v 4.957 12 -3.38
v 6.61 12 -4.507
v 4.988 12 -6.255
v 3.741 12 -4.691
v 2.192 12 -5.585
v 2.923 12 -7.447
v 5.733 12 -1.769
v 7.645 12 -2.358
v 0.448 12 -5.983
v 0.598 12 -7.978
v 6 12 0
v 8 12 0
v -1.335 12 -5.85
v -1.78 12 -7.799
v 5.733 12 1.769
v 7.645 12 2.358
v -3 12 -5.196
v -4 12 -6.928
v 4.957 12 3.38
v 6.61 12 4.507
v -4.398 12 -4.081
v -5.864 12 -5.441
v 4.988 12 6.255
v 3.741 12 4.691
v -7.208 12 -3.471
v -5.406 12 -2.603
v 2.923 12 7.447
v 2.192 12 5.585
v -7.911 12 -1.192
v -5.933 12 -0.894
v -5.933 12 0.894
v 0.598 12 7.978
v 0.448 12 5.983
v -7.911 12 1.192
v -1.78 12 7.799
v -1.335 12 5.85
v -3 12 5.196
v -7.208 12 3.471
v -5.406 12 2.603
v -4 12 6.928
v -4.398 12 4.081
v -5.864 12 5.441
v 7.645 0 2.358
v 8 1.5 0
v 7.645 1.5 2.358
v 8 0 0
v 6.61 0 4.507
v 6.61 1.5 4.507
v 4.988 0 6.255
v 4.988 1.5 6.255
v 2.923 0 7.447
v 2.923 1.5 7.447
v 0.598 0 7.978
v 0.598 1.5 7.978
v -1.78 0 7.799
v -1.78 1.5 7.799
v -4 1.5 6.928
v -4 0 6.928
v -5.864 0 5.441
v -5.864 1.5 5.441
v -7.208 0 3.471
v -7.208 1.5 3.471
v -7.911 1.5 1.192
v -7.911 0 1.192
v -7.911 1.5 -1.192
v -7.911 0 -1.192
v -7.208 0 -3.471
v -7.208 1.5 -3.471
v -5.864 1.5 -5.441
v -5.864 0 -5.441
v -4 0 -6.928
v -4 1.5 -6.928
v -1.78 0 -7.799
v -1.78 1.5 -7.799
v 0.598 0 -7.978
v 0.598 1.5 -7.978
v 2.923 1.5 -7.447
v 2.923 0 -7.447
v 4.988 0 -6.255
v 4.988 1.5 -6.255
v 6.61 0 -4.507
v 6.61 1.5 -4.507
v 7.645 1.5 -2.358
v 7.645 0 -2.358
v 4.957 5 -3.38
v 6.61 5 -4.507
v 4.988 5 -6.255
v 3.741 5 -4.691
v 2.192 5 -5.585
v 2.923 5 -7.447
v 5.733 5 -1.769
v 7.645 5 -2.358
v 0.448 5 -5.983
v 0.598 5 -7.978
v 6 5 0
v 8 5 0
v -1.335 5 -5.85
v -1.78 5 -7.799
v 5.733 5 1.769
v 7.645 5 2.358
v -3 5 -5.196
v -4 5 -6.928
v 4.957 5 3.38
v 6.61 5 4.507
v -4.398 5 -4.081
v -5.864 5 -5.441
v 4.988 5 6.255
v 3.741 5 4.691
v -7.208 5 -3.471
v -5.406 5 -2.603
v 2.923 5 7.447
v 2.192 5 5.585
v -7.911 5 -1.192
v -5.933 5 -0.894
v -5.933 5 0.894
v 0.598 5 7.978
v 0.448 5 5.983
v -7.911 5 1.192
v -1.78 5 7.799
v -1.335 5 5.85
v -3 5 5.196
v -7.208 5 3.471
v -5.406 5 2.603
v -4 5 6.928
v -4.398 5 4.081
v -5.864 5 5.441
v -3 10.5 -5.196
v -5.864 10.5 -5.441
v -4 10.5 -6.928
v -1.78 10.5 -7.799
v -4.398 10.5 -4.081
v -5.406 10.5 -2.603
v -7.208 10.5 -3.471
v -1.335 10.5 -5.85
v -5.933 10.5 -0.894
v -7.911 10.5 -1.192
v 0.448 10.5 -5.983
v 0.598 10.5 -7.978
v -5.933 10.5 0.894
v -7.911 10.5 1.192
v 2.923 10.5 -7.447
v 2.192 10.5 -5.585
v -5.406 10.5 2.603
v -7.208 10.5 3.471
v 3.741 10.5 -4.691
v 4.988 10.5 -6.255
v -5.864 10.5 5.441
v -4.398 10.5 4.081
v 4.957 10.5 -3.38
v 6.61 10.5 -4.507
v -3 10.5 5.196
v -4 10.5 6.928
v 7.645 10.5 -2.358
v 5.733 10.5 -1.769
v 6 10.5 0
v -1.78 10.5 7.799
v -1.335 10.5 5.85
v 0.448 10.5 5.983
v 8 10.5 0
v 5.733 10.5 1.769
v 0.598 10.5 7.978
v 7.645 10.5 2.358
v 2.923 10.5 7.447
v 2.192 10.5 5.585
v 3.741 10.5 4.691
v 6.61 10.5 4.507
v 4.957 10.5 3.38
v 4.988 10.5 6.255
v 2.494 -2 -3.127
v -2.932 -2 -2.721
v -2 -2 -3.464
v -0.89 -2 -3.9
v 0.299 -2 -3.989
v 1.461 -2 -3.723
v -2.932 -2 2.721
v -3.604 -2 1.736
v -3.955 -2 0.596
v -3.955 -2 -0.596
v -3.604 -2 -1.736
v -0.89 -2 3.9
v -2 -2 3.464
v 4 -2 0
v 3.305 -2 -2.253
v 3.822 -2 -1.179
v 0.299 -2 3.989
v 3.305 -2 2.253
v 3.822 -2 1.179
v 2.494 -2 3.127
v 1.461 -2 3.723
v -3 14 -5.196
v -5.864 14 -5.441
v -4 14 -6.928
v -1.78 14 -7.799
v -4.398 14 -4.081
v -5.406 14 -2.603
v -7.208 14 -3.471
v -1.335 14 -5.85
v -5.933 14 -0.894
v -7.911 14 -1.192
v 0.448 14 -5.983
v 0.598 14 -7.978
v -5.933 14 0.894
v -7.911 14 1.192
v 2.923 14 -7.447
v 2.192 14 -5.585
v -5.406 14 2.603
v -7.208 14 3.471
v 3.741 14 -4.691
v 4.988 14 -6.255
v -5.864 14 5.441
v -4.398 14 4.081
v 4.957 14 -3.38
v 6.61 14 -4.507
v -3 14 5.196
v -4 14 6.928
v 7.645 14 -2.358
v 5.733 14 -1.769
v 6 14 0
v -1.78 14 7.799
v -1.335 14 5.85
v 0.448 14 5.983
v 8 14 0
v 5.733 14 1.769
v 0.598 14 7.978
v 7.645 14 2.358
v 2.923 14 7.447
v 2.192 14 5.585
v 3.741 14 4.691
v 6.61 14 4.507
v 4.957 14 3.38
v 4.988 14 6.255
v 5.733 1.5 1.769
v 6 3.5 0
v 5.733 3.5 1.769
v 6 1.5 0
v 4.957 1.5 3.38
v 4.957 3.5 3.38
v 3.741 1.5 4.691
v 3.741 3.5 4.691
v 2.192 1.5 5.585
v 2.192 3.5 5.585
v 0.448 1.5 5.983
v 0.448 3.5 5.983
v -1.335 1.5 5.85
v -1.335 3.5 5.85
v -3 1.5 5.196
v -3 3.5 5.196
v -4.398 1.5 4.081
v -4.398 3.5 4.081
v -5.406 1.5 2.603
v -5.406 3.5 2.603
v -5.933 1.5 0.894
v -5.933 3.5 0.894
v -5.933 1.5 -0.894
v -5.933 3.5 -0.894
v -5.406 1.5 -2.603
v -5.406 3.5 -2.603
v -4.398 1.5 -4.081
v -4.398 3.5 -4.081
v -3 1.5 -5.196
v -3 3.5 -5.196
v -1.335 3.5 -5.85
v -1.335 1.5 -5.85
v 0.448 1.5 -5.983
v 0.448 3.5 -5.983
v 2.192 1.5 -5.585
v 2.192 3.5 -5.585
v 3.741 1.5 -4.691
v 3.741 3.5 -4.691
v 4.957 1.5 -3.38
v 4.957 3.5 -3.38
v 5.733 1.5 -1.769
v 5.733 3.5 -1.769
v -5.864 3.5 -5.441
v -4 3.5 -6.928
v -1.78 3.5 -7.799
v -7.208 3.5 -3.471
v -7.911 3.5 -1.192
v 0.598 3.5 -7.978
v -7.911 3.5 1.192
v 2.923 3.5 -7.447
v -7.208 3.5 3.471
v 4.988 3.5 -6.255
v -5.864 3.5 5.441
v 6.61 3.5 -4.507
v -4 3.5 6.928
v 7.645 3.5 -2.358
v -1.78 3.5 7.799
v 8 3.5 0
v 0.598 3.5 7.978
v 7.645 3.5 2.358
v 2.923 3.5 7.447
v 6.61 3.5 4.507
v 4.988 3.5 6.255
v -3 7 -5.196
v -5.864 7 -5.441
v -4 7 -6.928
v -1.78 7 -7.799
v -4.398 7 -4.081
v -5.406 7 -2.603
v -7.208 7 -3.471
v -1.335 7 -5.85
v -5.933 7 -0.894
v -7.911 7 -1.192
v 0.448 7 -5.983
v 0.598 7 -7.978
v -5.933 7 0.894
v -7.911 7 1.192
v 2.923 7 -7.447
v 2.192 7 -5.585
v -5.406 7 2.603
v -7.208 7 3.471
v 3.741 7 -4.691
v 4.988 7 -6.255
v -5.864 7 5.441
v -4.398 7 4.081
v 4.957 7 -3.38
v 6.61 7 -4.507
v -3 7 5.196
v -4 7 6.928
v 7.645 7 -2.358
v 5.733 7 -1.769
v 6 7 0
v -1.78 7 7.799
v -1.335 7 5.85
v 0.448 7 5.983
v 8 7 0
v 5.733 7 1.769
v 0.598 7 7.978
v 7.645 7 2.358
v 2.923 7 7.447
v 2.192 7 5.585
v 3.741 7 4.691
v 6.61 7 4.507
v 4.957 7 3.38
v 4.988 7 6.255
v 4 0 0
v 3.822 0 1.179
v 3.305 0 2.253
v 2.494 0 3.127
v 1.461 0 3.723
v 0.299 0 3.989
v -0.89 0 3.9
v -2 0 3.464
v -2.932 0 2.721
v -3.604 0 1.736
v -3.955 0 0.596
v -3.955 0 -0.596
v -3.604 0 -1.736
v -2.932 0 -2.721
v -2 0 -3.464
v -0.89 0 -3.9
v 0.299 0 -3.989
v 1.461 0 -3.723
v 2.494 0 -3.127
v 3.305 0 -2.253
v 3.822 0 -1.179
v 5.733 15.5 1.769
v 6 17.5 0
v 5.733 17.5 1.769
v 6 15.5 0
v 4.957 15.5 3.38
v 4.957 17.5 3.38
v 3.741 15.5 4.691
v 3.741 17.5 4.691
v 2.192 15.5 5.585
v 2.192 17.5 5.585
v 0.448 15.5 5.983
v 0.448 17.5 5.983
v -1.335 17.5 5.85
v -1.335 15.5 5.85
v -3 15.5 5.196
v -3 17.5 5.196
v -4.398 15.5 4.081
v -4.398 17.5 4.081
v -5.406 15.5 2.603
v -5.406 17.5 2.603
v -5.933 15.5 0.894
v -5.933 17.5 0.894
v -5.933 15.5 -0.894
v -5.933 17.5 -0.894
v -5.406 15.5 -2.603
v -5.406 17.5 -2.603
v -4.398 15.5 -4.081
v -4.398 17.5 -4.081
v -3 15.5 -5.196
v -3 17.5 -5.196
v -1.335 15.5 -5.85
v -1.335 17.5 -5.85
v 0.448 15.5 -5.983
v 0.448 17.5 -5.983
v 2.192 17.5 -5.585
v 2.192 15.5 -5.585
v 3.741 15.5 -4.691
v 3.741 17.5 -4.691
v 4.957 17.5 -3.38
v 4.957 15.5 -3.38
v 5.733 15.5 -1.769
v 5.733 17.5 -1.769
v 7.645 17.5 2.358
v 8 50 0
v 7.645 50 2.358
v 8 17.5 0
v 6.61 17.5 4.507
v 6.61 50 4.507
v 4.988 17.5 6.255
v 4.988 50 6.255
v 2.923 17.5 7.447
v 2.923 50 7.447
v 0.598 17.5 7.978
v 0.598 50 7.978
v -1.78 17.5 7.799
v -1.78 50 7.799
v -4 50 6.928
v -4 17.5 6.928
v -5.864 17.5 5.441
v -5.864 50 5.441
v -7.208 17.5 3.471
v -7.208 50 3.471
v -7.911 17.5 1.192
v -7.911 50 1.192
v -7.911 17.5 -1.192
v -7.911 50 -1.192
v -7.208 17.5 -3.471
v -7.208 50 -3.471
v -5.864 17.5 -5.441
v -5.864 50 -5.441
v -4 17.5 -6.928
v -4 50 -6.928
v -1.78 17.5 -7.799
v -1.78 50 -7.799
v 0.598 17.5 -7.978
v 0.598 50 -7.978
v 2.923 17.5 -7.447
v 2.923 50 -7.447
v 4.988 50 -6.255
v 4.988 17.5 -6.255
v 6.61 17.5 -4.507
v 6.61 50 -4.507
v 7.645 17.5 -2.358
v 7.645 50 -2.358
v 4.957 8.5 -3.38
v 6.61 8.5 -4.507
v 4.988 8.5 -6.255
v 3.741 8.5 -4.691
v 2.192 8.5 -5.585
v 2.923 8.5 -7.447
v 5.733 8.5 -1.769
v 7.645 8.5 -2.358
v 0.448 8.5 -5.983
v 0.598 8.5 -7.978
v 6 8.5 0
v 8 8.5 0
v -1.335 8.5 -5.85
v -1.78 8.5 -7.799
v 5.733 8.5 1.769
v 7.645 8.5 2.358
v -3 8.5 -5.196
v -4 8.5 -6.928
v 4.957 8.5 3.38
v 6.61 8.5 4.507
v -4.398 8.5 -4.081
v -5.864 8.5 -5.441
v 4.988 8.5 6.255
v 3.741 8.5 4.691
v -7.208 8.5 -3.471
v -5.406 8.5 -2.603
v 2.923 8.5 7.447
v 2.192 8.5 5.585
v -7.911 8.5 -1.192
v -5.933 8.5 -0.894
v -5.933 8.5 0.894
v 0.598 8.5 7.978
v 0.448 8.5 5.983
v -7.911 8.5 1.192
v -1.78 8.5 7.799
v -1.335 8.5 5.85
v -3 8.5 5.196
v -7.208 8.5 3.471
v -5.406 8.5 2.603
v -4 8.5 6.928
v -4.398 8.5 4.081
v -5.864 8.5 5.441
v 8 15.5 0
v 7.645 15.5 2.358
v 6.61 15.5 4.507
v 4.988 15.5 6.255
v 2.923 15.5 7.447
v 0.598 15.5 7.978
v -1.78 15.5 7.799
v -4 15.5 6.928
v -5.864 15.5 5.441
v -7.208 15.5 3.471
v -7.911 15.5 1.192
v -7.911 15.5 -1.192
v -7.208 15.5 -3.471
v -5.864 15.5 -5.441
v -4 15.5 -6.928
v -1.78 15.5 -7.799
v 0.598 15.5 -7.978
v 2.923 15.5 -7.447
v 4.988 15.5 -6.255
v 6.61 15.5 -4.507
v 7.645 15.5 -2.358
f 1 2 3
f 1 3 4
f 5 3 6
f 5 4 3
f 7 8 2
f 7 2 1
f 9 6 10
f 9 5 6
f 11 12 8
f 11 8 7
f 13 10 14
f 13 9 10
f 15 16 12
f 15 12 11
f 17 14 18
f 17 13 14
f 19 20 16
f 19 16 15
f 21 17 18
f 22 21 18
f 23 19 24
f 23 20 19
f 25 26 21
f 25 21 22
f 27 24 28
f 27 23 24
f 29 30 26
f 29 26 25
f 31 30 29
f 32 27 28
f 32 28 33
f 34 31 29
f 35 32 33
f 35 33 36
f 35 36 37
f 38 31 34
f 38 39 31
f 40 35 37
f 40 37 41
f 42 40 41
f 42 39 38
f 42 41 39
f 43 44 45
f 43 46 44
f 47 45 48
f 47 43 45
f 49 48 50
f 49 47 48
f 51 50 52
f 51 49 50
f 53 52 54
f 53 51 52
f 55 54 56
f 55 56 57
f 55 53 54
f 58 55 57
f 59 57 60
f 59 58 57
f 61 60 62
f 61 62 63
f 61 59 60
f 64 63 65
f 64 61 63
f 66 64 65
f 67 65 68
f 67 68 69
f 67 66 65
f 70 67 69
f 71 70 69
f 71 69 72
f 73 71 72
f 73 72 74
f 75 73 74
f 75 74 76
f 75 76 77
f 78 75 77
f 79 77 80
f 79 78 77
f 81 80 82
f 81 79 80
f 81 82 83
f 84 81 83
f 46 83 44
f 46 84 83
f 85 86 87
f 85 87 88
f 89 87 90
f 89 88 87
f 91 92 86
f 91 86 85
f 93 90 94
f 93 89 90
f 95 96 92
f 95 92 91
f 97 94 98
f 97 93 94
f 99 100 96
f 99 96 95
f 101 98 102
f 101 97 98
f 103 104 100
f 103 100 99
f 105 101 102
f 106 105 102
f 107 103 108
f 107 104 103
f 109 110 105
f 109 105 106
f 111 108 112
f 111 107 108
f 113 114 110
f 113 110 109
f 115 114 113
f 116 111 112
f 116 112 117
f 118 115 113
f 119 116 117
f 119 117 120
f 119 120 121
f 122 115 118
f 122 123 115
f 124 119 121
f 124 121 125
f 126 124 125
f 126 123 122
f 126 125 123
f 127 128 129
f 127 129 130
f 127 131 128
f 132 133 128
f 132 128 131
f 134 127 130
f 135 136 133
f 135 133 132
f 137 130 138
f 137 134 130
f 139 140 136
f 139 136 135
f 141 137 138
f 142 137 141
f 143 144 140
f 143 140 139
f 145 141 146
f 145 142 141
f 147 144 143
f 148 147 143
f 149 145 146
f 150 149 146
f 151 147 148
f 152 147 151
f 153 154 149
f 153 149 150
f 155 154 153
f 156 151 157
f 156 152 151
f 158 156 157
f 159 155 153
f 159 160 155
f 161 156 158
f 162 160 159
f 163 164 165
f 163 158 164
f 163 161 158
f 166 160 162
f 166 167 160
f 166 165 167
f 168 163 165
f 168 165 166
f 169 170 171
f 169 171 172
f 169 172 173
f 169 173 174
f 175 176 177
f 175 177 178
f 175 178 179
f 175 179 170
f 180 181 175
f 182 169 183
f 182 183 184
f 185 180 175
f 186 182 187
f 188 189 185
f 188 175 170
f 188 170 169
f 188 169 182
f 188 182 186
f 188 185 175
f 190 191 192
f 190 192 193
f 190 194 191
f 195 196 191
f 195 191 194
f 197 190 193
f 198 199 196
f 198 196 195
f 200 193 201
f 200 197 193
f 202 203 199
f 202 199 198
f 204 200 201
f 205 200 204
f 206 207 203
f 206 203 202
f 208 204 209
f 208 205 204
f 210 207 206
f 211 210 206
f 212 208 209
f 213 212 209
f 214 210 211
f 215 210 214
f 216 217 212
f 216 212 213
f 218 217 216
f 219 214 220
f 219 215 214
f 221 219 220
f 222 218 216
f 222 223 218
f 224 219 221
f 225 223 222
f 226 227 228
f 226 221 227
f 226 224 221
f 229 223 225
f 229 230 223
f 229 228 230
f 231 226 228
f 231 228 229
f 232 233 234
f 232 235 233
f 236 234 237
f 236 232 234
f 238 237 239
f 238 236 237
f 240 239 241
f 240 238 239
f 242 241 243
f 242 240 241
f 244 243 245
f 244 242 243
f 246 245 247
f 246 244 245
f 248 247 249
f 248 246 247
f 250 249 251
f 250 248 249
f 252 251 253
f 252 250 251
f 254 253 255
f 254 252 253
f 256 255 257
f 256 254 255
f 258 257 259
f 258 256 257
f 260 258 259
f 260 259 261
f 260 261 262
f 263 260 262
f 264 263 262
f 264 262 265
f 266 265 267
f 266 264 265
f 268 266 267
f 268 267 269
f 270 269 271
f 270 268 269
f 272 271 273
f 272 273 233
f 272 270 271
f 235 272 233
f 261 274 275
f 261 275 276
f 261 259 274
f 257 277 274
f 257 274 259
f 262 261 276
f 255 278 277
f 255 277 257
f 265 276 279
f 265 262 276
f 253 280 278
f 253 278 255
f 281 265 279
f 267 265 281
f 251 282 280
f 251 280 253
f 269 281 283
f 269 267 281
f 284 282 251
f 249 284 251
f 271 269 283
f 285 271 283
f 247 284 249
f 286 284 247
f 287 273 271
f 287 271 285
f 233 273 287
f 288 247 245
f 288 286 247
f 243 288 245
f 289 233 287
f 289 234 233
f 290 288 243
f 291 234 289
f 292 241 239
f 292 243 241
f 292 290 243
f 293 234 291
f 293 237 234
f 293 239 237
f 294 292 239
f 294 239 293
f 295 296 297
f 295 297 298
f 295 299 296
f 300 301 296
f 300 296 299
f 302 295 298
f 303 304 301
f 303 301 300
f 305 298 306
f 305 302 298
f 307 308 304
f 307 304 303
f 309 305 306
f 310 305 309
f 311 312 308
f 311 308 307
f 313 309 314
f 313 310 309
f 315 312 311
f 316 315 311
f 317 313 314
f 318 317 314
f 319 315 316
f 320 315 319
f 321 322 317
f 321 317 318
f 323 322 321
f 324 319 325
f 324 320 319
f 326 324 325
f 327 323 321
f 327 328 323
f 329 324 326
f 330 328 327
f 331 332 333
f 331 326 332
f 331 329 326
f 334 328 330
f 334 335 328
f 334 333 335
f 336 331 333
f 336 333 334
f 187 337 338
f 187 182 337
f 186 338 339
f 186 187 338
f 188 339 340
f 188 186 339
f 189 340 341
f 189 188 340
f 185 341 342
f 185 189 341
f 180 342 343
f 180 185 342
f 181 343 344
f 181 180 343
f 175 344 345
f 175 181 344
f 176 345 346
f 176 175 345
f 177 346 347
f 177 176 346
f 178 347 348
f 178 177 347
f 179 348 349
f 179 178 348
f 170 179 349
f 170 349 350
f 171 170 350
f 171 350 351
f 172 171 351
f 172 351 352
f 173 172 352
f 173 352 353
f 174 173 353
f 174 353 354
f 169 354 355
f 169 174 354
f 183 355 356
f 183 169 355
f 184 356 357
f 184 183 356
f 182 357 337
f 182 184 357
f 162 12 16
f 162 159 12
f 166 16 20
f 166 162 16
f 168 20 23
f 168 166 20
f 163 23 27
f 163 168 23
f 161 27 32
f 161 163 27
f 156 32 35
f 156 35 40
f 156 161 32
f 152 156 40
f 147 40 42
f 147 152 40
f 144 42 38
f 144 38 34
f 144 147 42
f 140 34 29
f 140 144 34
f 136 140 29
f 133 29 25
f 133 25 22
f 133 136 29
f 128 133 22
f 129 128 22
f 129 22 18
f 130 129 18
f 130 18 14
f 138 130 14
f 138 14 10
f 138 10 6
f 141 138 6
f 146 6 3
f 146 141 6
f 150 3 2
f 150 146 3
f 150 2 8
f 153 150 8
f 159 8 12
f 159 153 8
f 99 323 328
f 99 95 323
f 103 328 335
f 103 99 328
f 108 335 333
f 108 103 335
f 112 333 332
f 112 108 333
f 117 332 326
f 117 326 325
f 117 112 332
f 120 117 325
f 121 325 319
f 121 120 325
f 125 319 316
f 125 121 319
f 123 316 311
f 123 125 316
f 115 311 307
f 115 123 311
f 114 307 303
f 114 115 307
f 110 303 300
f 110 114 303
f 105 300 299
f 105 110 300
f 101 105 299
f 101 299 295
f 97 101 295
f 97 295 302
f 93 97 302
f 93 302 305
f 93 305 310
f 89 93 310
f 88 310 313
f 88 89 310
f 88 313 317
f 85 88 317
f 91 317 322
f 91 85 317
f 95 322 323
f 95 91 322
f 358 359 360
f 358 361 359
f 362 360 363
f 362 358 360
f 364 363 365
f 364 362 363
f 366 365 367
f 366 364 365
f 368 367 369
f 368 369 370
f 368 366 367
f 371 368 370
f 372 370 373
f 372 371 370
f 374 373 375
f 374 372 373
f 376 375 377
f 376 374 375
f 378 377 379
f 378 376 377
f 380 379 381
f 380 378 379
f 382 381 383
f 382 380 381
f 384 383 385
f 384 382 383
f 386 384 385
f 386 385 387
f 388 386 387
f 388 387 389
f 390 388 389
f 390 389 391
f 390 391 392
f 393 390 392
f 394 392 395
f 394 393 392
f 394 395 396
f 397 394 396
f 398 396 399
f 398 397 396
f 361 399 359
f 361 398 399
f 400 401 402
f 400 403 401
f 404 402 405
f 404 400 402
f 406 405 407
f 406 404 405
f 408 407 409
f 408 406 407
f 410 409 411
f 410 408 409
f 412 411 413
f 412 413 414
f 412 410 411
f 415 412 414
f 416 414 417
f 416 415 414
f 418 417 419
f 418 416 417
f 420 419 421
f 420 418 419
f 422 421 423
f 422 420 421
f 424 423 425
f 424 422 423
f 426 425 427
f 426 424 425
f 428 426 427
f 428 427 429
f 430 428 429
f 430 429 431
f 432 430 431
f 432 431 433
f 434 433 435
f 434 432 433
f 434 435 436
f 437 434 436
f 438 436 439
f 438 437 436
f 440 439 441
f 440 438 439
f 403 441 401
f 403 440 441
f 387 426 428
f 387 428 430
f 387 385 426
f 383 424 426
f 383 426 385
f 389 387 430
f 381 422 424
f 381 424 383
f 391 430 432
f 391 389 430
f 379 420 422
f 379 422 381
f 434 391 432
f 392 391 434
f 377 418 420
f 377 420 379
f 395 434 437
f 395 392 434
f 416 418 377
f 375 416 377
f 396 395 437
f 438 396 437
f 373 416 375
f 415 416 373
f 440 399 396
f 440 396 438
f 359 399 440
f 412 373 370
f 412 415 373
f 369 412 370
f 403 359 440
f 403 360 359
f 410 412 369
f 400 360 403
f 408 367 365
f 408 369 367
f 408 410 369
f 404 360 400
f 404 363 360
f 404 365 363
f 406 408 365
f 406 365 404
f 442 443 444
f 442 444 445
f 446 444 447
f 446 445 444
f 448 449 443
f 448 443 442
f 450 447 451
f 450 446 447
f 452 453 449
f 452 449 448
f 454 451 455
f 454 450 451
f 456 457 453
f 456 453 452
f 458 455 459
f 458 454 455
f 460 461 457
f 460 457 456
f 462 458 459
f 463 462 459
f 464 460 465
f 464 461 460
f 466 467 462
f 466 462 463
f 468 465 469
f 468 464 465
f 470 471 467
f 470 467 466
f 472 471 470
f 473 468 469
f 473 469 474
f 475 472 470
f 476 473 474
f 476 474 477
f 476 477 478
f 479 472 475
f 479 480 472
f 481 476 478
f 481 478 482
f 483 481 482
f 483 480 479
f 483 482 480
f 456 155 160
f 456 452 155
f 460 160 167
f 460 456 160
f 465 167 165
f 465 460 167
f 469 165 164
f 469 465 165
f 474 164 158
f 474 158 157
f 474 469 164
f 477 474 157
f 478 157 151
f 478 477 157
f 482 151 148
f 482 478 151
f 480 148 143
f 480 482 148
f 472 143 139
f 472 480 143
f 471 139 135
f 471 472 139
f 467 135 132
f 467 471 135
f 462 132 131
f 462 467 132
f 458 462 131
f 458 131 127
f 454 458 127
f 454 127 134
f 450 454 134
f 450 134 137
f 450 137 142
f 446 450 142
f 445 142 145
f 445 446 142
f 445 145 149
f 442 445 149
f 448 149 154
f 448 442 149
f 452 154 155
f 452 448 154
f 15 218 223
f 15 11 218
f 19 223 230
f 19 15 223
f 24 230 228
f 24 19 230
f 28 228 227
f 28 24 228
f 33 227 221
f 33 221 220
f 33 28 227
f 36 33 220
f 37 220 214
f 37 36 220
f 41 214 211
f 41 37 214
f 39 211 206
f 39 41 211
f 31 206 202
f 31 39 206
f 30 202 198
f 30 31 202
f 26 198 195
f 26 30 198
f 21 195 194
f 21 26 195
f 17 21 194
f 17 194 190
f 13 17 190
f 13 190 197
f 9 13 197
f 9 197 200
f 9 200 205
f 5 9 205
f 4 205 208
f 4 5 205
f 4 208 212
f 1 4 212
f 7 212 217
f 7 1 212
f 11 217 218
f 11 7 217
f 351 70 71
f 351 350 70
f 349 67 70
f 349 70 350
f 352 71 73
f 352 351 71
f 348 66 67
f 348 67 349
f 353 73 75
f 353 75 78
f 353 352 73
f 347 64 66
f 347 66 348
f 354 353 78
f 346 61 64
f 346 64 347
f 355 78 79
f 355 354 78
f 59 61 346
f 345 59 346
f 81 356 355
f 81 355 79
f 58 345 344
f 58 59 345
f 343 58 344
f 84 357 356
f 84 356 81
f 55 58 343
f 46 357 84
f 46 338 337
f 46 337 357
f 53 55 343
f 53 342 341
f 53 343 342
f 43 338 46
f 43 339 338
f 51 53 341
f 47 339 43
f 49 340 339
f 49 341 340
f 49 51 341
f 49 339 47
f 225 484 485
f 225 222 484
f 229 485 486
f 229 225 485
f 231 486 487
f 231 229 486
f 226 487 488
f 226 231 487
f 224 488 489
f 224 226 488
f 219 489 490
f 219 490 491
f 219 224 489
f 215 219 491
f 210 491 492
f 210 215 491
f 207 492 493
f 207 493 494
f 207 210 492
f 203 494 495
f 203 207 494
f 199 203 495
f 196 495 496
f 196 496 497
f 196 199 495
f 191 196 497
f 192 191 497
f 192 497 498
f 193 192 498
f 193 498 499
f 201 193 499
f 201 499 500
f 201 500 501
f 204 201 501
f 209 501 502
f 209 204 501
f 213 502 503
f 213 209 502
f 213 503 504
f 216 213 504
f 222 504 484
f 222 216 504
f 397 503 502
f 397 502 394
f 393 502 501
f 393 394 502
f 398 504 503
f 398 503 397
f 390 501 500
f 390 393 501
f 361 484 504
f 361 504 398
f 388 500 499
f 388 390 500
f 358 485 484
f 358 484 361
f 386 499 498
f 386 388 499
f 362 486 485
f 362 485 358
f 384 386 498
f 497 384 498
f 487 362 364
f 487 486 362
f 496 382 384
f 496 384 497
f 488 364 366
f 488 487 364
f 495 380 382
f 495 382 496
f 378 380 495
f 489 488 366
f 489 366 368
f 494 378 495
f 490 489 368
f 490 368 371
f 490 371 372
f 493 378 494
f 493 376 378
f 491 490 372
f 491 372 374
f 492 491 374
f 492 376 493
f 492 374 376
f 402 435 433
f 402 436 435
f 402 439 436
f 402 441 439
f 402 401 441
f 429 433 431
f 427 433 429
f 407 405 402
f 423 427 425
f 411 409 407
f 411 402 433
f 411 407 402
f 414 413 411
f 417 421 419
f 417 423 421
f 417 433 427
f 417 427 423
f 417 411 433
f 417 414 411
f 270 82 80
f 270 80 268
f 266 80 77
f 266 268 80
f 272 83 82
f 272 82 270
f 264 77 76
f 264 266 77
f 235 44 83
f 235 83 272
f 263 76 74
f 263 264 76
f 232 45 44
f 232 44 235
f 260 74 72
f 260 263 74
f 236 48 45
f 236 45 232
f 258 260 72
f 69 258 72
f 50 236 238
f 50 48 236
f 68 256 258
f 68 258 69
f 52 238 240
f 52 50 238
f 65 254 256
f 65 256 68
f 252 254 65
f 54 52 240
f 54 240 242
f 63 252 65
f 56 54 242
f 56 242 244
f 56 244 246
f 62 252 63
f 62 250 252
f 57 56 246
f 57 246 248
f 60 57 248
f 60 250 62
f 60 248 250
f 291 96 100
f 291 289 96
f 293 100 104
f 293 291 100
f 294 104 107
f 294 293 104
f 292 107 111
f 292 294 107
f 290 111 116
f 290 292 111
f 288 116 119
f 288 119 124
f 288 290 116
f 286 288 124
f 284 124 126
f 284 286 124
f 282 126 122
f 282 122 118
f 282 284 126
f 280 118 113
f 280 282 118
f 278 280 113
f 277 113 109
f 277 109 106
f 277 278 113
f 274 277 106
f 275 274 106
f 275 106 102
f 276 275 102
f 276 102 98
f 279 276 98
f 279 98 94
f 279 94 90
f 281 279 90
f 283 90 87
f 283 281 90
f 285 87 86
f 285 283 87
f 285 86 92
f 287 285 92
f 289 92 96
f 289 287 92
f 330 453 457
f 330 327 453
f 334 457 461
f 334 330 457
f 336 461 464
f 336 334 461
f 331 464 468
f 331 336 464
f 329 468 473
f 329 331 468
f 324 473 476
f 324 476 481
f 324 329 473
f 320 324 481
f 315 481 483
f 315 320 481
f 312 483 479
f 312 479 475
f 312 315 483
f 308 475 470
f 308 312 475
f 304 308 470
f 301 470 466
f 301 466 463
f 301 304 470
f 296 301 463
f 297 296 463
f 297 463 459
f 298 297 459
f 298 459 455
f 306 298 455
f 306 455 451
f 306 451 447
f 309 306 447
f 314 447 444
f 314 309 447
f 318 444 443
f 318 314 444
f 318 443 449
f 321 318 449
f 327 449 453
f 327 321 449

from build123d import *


with BuildPart() as part:
    # Croquis1 → Revolución1 (revolve)
    with BuildSketch(Plane.XY):
        Polygon((0, 50), (8, 50), (8, 17.5), (6, 17.5), (6, 15.5), (8, 15.5), (8, 14), (6, 14), (6, 12), (8, 12), (8, 10.5), (6, 10.5), (6, 8.5), (8, 8.5), (8, 7), (6, 7), (6, 5), (8, 5), (8, 3.5), (6, 3.5), (6, 1.5), (8, 1.5), (8, 0), (4, 0), (4, -2), (0, -2), (0, 0), align=None)
    revolve(axis=Axis((0, 68.764044944, 0), (0, -1, 0)))


solid = part.part
